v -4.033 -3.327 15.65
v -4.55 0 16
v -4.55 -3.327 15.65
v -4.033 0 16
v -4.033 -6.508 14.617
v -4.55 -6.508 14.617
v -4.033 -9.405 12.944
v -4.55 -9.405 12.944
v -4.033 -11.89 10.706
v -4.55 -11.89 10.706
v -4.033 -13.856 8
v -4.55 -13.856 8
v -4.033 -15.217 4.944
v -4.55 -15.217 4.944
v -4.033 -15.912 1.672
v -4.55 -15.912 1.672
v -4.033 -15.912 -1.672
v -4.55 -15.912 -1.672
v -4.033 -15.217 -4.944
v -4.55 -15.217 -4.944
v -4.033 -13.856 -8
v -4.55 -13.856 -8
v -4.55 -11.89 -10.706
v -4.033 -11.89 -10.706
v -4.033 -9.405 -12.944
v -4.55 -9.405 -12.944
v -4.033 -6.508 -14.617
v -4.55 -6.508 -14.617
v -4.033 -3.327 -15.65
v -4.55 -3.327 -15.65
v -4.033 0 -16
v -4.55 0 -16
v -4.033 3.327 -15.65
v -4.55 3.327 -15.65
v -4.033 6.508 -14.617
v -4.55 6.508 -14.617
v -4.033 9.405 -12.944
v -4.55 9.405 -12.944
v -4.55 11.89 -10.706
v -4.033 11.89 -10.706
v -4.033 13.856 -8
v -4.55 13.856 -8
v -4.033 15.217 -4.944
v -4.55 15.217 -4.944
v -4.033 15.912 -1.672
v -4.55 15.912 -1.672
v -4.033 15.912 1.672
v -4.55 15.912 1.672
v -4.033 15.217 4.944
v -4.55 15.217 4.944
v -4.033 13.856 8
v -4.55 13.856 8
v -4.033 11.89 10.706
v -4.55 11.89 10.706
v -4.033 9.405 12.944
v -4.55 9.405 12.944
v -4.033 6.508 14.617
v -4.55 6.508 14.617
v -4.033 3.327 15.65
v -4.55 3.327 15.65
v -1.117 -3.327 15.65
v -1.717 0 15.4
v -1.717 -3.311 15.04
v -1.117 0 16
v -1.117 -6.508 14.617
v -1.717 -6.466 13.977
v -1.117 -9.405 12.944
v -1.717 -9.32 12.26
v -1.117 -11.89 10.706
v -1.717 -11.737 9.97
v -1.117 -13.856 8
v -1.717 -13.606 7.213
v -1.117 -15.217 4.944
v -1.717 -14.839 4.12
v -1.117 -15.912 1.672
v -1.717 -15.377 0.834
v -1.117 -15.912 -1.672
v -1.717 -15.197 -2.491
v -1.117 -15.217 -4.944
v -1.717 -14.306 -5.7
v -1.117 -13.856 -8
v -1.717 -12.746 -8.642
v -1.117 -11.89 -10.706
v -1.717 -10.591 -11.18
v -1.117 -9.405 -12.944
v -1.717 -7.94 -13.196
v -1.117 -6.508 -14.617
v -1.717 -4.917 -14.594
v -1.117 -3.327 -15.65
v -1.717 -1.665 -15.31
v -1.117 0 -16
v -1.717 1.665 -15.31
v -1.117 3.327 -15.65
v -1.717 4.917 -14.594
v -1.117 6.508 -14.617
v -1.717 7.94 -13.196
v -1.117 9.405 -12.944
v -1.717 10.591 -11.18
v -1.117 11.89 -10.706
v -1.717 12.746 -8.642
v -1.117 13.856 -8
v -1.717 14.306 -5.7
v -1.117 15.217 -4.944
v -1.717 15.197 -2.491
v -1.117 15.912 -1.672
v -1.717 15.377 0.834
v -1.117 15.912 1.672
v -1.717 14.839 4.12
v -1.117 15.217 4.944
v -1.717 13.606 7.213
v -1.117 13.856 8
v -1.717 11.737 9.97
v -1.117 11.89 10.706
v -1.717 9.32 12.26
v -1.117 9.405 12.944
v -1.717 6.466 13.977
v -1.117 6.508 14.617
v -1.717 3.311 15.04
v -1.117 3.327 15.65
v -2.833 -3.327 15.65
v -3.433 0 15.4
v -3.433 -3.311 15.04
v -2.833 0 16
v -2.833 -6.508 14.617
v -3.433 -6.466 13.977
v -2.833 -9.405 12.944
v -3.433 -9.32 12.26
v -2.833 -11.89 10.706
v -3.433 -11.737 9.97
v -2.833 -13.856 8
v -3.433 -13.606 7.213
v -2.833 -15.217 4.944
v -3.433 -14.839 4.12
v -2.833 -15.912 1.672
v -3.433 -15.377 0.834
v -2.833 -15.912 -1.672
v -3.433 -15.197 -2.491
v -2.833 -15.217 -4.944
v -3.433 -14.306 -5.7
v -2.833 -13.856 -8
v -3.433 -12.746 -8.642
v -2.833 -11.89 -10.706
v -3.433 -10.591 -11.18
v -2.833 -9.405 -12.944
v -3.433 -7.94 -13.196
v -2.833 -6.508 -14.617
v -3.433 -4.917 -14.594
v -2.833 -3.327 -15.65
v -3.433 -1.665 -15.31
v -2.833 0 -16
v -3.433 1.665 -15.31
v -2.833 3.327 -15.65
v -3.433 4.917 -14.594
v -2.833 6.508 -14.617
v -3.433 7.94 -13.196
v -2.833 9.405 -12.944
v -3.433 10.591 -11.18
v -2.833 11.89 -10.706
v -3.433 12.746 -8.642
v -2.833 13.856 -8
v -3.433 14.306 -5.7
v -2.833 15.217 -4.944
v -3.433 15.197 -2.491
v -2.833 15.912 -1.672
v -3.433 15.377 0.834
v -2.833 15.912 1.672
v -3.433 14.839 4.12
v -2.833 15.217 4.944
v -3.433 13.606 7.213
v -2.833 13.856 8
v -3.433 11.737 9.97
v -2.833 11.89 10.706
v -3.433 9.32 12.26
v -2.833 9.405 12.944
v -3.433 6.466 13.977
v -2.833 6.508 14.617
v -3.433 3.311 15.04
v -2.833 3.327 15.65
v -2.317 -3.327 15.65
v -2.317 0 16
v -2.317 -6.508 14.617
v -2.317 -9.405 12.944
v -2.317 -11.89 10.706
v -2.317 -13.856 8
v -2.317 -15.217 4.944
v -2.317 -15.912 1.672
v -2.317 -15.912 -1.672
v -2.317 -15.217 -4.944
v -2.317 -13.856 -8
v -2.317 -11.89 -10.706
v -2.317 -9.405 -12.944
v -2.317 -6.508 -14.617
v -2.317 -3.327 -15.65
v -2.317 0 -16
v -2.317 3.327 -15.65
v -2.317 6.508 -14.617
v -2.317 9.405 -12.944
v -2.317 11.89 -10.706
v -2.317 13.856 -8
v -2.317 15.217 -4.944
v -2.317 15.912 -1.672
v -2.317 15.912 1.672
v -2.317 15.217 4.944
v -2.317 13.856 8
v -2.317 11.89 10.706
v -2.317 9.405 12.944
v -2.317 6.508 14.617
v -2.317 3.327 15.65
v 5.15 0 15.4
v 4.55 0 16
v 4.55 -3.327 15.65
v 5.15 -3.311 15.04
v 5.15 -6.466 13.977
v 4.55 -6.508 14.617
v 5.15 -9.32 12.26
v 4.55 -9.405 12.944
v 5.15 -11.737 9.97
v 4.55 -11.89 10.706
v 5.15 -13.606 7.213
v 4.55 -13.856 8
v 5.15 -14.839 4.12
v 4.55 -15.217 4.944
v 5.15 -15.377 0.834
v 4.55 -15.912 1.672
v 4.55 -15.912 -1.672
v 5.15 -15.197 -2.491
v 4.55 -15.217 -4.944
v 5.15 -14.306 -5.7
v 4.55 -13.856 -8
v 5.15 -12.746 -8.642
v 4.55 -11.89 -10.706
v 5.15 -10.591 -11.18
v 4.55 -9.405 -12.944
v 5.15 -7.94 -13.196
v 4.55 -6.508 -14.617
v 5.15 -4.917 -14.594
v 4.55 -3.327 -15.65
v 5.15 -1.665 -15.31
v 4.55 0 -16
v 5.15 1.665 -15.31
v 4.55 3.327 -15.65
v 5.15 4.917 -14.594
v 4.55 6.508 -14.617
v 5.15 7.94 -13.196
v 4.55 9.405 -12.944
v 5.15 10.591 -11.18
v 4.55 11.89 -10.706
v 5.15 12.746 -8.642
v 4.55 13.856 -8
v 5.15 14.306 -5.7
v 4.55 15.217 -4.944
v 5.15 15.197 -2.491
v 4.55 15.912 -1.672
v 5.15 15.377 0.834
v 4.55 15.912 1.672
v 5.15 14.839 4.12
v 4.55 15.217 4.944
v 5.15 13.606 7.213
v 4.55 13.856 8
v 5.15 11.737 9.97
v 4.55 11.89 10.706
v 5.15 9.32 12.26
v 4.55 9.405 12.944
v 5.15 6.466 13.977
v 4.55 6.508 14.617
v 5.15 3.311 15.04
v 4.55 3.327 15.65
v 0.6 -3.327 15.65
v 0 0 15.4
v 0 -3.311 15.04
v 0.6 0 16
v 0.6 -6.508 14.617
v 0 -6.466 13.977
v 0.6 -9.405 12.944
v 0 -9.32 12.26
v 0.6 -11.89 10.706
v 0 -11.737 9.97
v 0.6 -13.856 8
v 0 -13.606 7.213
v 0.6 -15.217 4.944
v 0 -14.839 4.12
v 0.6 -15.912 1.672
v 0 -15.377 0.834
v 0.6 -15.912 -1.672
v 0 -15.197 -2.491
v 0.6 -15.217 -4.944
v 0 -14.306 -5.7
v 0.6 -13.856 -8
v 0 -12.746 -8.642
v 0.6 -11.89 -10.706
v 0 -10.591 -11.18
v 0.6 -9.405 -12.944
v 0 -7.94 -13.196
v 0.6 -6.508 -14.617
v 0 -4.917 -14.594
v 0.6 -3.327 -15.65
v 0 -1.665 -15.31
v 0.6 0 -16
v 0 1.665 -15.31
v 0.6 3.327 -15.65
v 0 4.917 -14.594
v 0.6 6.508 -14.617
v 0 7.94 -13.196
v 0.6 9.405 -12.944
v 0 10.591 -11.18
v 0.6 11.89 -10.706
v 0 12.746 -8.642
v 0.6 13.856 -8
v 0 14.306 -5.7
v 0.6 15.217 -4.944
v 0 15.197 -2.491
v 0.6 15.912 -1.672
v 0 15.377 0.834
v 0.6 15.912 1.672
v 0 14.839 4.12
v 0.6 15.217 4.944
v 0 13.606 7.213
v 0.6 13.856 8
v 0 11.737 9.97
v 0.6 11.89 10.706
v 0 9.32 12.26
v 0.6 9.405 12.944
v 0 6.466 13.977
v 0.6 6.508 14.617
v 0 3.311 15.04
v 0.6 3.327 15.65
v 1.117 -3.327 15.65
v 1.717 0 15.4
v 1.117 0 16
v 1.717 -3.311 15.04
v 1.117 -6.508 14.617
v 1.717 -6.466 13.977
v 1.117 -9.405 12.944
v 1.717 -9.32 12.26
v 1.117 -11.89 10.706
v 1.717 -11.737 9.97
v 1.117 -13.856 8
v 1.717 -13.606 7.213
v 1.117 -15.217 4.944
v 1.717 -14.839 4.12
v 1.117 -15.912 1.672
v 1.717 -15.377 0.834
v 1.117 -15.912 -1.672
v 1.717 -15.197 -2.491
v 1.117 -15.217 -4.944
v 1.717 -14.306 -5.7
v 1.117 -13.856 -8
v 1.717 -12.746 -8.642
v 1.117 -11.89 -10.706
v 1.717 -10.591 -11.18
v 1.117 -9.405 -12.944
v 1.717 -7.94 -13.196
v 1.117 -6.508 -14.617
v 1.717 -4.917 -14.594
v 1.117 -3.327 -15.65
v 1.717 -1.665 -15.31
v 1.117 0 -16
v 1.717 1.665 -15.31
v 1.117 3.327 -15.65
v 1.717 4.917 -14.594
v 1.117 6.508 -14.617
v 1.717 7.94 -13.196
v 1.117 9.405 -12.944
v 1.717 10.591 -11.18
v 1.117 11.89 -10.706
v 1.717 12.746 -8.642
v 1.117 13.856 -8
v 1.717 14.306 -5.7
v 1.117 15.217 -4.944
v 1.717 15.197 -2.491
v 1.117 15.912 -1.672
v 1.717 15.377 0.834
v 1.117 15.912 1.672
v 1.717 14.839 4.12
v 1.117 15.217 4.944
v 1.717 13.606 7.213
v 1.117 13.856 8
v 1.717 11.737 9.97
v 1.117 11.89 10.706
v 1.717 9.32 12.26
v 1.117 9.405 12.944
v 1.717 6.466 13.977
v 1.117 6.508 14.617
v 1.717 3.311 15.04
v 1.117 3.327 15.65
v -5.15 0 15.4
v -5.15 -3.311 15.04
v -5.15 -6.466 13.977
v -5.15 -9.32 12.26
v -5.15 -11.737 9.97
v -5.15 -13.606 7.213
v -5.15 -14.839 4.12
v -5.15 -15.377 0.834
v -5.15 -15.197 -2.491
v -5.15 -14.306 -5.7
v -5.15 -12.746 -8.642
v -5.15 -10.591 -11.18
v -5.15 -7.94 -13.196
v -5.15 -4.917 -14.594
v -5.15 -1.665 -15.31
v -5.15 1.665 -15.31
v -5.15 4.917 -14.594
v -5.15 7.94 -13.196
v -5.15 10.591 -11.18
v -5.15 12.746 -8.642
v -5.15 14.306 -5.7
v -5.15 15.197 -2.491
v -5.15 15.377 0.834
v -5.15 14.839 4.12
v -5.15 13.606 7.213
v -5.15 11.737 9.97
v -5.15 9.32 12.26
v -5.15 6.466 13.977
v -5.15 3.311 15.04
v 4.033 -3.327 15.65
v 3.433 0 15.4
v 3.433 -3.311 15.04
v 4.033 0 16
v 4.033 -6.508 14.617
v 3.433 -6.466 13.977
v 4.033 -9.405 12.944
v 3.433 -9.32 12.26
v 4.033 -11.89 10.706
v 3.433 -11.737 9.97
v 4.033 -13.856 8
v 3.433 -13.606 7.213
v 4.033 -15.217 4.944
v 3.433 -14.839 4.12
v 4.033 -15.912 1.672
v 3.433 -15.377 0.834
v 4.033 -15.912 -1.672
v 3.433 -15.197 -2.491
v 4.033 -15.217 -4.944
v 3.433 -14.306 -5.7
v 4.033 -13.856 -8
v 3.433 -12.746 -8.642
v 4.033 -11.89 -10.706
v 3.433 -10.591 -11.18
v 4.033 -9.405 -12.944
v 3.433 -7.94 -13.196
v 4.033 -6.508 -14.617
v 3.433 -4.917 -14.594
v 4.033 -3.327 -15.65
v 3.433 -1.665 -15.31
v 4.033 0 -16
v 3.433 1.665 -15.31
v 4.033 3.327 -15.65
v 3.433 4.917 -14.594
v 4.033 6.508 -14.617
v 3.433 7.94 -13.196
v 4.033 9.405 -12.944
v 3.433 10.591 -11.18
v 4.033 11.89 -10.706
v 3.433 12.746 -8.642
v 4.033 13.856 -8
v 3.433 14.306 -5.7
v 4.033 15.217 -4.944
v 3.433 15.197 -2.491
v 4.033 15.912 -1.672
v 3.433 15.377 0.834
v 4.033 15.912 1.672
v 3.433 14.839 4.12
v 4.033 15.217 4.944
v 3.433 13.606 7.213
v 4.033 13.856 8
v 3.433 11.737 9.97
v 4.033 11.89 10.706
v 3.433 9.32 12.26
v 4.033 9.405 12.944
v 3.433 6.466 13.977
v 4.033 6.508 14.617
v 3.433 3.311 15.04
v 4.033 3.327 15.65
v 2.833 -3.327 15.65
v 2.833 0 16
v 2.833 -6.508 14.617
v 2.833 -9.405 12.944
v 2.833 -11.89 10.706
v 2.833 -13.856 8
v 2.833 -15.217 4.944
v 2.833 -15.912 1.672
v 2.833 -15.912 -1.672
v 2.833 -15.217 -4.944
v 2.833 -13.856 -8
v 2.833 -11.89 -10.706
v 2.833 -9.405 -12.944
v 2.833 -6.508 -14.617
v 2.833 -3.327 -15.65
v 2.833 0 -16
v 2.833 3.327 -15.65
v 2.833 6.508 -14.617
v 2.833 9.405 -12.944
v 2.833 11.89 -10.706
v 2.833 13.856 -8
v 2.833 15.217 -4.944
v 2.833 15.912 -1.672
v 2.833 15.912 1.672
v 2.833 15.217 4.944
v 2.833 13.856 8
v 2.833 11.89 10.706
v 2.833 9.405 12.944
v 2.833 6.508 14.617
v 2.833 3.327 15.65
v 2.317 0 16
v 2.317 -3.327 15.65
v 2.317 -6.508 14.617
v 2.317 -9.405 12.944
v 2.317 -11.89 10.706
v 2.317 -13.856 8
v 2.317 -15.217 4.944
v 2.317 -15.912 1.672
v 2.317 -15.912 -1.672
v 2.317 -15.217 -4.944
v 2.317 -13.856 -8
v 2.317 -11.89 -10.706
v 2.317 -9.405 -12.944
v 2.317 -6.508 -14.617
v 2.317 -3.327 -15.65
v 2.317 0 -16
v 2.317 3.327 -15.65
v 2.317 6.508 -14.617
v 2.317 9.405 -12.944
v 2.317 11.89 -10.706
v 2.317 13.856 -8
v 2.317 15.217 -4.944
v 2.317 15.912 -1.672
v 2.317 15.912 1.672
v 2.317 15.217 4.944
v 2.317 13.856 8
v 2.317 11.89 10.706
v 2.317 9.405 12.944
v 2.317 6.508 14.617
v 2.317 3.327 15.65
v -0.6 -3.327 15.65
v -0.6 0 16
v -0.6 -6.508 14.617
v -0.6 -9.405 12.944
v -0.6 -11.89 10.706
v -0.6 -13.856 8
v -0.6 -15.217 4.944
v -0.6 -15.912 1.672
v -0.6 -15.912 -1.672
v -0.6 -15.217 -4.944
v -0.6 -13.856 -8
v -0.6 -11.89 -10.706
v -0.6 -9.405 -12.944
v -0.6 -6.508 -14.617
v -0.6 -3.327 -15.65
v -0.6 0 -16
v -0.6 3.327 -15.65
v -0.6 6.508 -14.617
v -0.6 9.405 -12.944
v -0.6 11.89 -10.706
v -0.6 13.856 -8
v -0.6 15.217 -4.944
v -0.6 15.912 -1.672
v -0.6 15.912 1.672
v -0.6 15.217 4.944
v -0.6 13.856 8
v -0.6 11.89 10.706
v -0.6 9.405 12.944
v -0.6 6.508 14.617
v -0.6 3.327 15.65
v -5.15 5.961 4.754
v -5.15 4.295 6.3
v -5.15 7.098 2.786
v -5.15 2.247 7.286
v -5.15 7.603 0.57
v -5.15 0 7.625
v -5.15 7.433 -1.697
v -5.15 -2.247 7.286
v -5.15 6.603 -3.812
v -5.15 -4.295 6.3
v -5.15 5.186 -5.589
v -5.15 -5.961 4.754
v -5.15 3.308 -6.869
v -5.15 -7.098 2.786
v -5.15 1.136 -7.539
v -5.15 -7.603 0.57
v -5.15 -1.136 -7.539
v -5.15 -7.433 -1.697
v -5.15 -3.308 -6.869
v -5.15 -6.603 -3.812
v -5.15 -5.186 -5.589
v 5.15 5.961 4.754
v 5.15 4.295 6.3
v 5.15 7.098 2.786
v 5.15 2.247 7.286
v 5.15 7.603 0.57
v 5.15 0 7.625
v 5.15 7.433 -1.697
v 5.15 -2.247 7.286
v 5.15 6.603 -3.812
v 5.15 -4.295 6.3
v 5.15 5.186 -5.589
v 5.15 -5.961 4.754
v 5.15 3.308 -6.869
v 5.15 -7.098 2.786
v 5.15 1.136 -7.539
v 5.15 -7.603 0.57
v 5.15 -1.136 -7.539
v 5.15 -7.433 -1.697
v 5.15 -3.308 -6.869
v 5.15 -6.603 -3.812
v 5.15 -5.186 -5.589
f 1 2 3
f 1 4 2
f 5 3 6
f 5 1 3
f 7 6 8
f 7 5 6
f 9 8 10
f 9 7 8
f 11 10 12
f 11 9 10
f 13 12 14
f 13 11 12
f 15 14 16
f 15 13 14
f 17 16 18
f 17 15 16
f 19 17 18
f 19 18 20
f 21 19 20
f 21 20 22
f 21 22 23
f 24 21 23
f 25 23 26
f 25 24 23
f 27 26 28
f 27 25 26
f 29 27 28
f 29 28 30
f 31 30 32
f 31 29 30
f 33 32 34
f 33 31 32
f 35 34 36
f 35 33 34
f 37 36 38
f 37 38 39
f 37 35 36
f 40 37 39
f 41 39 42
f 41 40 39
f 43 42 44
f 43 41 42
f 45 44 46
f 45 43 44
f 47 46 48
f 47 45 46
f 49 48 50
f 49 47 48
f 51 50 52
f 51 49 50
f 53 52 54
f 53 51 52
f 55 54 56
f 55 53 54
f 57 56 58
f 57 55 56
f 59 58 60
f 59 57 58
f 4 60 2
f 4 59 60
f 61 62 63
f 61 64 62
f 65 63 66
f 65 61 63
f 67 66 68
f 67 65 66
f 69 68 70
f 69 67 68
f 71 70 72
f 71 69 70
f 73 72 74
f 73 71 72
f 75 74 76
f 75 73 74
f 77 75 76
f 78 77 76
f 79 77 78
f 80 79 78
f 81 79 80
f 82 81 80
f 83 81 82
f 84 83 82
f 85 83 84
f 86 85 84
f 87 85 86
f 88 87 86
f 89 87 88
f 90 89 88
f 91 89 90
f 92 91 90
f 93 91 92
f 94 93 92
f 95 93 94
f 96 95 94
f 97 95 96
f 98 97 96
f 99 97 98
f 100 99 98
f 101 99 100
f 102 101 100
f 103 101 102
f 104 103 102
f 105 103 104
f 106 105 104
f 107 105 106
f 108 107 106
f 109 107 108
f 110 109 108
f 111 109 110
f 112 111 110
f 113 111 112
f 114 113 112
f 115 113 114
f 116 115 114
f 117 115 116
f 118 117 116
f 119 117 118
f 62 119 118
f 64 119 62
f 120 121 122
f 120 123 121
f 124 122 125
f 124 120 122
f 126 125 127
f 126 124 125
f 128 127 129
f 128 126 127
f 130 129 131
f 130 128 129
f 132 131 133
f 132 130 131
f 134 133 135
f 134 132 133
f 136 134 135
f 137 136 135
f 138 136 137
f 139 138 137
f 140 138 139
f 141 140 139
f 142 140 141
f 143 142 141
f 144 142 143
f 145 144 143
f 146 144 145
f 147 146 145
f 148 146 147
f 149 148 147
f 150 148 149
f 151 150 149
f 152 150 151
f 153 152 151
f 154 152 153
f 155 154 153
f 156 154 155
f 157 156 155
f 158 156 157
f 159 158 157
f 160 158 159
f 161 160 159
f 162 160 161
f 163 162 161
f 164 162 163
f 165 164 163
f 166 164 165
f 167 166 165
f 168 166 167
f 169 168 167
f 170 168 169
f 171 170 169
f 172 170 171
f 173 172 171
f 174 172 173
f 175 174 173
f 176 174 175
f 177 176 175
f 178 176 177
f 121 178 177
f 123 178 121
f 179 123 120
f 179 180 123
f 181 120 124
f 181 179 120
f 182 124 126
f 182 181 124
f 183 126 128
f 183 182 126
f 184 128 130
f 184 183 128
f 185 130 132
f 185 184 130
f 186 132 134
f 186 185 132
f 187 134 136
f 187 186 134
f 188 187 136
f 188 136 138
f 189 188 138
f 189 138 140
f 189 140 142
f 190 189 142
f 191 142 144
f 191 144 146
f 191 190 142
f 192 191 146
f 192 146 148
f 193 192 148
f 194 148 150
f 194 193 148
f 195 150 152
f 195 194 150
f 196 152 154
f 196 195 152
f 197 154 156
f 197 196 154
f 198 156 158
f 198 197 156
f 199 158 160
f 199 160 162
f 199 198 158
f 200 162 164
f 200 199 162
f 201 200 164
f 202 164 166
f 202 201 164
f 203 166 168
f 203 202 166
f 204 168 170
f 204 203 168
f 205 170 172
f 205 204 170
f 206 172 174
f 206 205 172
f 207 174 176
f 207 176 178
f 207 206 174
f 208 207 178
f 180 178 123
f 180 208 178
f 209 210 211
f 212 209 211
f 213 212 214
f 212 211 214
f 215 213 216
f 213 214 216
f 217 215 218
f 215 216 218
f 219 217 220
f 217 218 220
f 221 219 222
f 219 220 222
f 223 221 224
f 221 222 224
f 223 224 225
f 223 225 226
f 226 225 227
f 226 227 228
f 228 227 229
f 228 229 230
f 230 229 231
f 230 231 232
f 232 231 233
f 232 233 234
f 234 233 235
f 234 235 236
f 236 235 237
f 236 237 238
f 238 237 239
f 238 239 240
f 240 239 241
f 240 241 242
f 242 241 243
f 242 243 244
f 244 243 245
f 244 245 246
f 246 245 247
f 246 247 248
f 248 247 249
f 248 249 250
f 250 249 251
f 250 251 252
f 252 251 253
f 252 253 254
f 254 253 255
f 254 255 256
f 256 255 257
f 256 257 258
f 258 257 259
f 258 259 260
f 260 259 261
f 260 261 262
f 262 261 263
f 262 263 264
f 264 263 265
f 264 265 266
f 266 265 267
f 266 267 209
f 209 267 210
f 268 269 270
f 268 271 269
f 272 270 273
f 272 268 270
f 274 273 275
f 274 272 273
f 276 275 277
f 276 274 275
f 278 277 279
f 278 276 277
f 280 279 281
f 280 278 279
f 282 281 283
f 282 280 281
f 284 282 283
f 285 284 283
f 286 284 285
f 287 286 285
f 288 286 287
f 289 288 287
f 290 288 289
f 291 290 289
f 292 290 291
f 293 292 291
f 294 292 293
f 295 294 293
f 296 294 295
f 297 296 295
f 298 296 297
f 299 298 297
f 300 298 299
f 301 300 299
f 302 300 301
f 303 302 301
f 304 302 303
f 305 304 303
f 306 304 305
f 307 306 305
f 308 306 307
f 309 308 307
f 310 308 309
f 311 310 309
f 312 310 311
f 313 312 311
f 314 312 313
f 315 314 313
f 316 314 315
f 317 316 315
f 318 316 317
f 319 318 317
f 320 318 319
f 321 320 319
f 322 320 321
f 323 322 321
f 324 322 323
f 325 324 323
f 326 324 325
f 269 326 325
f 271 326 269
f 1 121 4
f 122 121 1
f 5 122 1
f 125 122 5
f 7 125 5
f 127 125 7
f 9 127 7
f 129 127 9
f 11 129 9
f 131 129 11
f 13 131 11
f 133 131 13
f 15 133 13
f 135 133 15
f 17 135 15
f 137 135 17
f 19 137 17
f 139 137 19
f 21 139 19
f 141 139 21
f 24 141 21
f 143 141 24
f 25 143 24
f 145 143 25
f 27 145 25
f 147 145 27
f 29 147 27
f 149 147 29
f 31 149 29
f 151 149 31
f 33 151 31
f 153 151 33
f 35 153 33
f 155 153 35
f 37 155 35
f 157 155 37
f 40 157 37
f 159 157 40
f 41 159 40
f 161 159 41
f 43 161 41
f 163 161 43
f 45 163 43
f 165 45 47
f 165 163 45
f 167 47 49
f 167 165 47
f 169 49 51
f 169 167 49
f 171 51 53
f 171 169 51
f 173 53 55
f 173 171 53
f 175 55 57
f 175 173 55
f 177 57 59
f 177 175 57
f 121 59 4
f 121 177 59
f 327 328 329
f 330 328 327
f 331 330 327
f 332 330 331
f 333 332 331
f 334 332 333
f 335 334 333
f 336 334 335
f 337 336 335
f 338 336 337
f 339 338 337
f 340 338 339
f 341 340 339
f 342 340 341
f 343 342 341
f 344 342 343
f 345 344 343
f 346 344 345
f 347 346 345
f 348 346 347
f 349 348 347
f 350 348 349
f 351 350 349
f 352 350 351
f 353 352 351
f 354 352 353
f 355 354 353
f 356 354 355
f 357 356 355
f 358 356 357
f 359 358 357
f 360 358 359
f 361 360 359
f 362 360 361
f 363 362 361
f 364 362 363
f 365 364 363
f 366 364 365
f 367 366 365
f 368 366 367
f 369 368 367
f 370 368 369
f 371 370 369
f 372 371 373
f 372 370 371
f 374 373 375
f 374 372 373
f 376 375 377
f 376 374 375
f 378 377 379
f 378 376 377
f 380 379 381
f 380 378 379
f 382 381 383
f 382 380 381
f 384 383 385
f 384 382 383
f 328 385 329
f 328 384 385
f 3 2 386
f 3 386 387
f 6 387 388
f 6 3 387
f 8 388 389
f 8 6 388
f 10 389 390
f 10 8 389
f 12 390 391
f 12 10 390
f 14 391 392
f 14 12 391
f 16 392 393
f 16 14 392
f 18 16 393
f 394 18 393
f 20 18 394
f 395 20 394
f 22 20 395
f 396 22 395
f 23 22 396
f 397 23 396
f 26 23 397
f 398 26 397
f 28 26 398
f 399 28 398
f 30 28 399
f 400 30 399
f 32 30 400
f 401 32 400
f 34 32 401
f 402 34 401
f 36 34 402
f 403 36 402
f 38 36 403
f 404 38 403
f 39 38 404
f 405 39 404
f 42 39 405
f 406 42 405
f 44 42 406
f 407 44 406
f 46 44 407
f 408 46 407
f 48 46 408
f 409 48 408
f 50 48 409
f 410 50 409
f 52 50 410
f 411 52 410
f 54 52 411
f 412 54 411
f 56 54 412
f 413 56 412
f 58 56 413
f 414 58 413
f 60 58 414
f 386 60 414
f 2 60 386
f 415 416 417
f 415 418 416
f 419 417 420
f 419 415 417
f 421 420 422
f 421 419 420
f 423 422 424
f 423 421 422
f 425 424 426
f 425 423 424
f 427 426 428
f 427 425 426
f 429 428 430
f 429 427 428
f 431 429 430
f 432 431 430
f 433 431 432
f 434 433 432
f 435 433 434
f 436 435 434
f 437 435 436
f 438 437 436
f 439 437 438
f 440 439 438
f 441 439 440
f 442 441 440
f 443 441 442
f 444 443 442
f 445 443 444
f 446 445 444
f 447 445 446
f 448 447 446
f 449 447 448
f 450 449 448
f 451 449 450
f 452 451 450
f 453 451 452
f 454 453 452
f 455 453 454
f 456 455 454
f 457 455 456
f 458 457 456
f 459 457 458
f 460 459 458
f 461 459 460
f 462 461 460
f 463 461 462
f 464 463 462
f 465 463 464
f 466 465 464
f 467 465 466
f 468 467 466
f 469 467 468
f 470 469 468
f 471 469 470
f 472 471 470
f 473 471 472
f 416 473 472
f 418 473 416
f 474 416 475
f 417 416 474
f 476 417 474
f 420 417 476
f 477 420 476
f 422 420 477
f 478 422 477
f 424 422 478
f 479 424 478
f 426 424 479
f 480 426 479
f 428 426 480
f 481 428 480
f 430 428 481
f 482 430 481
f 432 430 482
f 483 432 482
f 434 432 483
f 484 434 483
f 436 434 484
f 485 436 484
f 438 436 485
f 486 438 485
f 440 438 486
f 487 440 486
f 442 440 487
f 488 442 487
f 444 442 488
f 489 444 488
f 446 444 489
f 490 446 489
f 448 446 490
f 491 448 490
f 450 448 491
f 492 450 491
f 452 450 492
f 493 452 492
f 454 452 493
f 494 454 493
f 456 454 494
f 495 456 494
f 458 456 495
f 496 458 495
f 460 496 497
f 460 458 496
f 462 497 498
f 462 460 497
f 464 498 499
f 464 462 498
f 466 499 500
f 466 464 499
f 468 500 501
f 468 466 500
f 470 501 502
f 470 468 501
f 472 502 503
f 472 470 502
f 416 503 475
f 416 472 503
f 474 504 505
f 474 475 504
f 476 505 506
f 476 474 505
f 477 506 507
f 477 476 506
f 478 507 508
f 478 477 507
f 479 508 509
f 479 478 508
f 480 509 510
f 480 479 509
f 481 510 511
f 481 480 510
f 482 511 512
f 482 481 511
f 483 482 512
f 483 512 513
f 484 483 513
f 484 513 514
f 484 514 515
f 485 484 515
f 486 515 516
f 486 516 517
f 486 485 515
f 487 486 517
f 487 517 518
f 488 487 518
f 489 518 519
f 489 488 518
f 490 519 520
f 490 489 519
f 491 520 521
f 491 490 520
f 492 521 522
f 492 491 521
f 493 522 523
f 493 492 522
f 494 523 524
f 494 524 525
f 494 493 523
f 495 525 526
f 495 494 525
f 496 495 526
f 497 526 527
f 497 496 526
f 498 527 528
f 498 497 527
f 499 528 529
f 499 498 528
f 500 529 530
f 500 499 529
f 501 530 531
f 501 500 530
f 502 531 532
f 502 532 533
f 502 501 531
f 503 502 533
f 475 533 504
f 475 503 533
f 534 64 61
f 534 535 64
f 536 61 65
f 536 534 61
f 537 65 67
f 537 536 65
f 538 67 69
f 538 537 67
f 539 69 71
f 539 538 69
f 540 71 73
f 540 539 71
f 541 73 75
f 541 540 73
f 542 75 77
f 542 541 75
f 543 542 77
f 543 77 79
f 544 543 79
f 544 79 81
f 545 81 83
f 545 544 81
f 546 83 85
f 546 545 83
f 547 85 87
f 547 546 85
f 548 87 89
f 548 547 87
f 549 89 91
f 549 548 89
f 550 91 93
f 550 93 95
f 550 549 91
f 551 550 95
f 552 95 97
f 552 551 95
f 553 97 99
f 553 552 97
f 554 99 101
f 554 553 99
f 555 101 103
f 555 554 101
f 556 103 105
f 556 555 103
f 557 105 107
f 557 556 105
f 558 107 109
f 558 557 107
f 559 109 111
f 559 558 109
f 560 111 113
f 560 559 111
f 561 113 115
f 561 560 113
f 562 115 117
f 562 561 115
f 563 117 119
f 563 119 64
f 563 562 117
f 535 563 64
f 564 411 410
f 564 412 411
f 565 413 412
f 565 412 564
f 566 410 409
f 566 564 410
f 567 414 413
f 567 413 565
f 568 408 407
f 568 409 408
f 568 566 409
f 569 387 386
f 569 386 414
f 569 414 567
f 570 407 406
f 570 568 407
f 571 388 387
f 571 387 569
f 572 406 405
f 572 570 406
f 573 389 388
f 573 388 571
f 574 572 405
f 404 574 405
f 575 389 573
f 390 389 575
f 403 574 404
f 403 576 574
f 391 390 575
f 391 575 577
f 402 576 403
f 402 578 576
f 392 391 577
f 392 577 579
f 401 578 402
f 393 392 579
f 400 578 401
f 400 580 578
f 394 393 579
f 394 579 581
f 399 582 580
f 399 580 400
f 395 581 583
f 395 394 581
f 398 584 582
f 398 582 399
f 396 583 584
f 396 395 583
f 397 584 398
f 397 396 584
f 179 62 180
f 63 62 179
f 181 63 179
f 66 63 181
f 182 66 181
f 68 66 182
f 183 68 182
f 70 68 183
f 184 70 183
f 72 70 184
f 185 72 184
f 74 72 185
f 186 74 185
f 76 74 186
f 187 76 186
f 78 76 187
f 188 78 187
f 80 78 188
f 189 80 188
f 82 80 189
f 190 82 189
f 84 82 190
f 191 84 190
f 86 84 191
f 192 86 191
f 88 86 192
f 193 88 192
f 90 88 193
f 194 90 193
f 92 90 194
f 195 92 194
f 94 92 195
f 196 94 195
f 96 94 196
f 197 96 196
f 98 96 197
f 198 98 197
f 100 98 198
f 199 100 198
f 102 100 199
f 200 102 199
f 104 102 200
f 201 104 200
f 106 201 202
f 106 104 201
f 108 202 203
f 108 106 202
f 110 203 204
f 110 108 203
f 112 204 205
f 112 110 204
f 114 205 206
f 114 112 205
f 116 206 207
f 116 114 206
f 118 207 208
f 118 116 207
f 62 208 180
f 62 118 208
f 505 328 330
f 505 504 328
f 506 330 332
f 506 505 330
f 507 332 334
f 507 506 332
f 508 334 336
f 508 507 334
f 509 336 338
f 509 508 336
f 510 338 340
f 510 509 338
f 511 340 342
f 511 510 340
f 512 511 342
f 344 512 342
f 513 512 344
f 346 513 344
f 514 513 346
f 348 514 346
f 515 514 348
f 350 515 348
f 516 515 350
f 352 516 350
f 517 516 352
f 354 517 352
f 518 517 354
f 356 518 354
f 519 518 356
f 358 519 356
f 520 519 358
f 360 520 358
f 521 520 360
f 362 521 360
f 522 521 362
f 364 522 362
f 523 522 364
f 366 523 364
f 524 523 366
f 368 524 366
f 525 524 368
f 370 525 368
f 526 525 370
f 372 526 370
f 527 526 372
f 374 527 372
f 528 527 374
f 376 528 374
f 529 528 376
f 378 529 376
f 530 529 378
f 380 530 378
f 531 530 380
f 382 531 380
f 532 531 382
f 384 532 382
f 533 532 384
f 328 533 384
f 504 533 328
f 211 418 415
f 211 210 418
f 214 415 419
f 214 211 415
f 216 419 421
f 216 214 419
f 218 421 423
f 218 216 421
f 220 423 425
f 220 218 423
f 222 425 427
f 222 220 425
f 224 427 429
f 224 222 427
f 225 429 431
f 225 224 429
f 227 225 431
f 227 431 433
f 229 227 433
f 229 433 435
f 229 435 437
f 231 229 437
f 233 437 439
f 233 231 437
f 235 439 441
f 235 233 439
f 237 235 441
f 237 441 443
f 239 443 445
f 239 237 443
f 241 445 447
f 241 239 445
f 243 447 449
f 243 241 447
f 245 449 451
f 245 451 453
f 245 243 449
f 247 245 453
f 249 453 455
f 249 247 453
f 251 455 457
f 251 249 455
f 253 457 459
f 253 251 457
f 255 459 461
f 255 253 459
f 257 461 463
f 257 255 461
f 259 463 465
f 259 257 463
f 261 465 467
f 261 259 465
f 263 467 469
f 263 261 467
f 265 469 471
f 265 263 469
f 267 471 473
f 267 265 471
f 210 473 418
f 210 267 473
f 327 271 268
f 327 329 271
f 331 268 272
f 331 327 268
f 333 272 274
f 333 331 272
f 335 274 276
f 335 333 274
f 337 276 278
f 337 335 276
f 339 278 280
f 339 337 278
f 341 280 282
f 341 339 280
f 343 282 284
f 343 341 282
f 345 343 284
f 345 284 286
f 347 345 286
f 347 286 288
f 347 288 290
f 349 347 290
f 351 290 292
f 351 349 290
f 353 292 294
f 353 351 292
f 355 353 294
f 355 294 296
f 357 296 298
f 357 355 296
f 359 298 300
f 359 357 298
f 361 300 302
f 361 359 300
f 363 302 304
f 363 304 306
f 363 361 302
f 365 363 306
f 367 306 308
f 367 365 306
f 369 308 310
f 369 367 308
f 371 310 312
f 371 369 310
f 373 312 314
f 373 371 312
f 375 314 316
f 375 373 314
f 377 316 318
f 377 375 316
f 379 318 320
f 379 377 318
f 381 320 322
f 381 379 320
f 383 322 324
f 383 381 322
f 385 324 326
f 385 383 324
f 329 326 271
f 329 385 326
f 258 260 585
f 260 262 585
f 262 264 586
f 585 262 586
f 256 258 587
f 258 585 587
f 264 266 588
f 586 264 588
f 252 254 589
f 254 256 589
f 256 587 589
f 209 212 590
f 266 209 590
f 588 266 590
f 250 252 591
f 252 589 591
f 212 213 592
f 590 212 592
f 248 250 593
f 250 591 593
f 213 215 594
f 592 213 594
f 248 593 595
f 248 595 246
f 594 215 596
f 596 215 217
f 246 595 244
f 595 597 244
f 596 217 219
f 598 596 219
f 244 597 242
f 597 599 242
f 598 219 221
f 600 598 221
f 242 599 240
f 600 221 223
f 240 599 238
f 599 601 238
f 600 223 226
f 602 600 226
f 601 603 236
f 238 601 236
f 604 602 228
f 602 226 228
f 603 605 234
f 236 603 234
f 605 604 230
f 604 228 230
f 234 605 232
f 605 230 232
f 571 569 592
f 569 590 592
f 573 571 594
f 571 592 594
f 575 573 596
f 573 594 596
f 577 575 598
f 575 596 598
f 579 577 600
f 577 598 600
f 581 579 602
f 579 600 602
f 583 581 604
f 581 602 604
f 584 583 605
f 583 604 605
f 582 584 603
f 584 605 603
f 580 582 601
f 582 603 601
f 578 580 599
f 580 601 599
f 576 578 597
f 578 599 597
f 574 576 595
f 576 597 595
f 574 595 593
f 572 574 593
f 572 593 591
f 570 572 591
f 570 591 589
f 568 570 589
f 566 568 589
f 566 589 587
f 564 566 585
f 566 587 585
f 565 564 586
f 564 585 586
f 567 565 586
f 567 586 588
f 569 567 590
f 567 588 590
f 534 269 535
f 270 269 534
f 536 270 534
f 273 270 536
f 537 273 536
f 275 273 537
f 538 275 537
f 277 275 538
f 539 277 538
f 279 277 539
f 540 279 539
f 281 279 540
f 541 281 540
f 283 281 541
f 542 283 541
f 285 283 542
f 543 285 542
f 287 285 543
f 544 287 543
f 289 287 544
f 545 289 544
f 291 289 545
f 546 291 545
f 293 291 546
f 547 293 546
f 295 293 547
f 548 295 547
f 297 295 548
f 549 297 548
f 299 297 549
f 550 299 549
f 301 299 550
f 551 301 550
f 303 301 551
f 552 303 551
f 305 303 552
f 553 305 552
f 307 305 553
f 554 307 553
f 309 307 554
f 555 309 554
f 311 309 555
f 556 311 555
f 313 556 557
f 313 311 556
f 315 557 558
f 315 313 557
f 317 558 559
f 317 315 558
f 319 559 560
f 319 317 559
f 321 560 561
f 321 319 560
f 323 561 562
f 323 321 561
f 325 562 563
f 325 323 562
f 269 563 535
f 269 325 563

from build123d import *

# Parameters (mm, degrees)
SKETCH1_W     = 10.3
SKETCH1_H     = 8.375438596
CHAMFER1_SIZE = 0.6


with BuildPart() as part:
    # Sketch1 → Revolve1 (revolve)
    with BuildSketch(Plane.XY):
        with Locations((0, 11.812280702)):
            Rectangle(SKETCH1_W, SKETCH1_H)
    revolve(axis=Axis((0, 0, 0), (1, 0, 0)))

    # Chamfer1
    chamfer1_edges = [part.edges().sort_by_distance(p)[0] for p in [
        (5.15, -16, 0),
        (-5.15, -16, 0),
    ]]
    chamfer(chamfer1_edges, length=CHAMFER1_SIZE)

    # Sketch2 → Cut-Revolve1 (revolve, cut)
    with BuildSketch(Plane.XY):
        Polygon((-4.033333333, 16), (-3.433333333, 15.4), (-2.833333333, 16), align=None)
        Polygon((-1.716666667, 15.4), (-1.116666667, 16), (-2.316666667, 16), align=None)
        Polygon((0, 15.4), (0.6, 16), (-0.6, 16), align=None)
        Polygon((1.716666667, 15.4), (2.316666667, 16), (1.116666667, 16), align=None)
        Polygon((3.433333333, 15.4), (4.033333333, 16), (2.833333333, 16), align=None)
    revolve(axis=Axis((0, 0, 0), (1, 0, 0)), mode=Mode.SUBTRACT)


solid = part.part
